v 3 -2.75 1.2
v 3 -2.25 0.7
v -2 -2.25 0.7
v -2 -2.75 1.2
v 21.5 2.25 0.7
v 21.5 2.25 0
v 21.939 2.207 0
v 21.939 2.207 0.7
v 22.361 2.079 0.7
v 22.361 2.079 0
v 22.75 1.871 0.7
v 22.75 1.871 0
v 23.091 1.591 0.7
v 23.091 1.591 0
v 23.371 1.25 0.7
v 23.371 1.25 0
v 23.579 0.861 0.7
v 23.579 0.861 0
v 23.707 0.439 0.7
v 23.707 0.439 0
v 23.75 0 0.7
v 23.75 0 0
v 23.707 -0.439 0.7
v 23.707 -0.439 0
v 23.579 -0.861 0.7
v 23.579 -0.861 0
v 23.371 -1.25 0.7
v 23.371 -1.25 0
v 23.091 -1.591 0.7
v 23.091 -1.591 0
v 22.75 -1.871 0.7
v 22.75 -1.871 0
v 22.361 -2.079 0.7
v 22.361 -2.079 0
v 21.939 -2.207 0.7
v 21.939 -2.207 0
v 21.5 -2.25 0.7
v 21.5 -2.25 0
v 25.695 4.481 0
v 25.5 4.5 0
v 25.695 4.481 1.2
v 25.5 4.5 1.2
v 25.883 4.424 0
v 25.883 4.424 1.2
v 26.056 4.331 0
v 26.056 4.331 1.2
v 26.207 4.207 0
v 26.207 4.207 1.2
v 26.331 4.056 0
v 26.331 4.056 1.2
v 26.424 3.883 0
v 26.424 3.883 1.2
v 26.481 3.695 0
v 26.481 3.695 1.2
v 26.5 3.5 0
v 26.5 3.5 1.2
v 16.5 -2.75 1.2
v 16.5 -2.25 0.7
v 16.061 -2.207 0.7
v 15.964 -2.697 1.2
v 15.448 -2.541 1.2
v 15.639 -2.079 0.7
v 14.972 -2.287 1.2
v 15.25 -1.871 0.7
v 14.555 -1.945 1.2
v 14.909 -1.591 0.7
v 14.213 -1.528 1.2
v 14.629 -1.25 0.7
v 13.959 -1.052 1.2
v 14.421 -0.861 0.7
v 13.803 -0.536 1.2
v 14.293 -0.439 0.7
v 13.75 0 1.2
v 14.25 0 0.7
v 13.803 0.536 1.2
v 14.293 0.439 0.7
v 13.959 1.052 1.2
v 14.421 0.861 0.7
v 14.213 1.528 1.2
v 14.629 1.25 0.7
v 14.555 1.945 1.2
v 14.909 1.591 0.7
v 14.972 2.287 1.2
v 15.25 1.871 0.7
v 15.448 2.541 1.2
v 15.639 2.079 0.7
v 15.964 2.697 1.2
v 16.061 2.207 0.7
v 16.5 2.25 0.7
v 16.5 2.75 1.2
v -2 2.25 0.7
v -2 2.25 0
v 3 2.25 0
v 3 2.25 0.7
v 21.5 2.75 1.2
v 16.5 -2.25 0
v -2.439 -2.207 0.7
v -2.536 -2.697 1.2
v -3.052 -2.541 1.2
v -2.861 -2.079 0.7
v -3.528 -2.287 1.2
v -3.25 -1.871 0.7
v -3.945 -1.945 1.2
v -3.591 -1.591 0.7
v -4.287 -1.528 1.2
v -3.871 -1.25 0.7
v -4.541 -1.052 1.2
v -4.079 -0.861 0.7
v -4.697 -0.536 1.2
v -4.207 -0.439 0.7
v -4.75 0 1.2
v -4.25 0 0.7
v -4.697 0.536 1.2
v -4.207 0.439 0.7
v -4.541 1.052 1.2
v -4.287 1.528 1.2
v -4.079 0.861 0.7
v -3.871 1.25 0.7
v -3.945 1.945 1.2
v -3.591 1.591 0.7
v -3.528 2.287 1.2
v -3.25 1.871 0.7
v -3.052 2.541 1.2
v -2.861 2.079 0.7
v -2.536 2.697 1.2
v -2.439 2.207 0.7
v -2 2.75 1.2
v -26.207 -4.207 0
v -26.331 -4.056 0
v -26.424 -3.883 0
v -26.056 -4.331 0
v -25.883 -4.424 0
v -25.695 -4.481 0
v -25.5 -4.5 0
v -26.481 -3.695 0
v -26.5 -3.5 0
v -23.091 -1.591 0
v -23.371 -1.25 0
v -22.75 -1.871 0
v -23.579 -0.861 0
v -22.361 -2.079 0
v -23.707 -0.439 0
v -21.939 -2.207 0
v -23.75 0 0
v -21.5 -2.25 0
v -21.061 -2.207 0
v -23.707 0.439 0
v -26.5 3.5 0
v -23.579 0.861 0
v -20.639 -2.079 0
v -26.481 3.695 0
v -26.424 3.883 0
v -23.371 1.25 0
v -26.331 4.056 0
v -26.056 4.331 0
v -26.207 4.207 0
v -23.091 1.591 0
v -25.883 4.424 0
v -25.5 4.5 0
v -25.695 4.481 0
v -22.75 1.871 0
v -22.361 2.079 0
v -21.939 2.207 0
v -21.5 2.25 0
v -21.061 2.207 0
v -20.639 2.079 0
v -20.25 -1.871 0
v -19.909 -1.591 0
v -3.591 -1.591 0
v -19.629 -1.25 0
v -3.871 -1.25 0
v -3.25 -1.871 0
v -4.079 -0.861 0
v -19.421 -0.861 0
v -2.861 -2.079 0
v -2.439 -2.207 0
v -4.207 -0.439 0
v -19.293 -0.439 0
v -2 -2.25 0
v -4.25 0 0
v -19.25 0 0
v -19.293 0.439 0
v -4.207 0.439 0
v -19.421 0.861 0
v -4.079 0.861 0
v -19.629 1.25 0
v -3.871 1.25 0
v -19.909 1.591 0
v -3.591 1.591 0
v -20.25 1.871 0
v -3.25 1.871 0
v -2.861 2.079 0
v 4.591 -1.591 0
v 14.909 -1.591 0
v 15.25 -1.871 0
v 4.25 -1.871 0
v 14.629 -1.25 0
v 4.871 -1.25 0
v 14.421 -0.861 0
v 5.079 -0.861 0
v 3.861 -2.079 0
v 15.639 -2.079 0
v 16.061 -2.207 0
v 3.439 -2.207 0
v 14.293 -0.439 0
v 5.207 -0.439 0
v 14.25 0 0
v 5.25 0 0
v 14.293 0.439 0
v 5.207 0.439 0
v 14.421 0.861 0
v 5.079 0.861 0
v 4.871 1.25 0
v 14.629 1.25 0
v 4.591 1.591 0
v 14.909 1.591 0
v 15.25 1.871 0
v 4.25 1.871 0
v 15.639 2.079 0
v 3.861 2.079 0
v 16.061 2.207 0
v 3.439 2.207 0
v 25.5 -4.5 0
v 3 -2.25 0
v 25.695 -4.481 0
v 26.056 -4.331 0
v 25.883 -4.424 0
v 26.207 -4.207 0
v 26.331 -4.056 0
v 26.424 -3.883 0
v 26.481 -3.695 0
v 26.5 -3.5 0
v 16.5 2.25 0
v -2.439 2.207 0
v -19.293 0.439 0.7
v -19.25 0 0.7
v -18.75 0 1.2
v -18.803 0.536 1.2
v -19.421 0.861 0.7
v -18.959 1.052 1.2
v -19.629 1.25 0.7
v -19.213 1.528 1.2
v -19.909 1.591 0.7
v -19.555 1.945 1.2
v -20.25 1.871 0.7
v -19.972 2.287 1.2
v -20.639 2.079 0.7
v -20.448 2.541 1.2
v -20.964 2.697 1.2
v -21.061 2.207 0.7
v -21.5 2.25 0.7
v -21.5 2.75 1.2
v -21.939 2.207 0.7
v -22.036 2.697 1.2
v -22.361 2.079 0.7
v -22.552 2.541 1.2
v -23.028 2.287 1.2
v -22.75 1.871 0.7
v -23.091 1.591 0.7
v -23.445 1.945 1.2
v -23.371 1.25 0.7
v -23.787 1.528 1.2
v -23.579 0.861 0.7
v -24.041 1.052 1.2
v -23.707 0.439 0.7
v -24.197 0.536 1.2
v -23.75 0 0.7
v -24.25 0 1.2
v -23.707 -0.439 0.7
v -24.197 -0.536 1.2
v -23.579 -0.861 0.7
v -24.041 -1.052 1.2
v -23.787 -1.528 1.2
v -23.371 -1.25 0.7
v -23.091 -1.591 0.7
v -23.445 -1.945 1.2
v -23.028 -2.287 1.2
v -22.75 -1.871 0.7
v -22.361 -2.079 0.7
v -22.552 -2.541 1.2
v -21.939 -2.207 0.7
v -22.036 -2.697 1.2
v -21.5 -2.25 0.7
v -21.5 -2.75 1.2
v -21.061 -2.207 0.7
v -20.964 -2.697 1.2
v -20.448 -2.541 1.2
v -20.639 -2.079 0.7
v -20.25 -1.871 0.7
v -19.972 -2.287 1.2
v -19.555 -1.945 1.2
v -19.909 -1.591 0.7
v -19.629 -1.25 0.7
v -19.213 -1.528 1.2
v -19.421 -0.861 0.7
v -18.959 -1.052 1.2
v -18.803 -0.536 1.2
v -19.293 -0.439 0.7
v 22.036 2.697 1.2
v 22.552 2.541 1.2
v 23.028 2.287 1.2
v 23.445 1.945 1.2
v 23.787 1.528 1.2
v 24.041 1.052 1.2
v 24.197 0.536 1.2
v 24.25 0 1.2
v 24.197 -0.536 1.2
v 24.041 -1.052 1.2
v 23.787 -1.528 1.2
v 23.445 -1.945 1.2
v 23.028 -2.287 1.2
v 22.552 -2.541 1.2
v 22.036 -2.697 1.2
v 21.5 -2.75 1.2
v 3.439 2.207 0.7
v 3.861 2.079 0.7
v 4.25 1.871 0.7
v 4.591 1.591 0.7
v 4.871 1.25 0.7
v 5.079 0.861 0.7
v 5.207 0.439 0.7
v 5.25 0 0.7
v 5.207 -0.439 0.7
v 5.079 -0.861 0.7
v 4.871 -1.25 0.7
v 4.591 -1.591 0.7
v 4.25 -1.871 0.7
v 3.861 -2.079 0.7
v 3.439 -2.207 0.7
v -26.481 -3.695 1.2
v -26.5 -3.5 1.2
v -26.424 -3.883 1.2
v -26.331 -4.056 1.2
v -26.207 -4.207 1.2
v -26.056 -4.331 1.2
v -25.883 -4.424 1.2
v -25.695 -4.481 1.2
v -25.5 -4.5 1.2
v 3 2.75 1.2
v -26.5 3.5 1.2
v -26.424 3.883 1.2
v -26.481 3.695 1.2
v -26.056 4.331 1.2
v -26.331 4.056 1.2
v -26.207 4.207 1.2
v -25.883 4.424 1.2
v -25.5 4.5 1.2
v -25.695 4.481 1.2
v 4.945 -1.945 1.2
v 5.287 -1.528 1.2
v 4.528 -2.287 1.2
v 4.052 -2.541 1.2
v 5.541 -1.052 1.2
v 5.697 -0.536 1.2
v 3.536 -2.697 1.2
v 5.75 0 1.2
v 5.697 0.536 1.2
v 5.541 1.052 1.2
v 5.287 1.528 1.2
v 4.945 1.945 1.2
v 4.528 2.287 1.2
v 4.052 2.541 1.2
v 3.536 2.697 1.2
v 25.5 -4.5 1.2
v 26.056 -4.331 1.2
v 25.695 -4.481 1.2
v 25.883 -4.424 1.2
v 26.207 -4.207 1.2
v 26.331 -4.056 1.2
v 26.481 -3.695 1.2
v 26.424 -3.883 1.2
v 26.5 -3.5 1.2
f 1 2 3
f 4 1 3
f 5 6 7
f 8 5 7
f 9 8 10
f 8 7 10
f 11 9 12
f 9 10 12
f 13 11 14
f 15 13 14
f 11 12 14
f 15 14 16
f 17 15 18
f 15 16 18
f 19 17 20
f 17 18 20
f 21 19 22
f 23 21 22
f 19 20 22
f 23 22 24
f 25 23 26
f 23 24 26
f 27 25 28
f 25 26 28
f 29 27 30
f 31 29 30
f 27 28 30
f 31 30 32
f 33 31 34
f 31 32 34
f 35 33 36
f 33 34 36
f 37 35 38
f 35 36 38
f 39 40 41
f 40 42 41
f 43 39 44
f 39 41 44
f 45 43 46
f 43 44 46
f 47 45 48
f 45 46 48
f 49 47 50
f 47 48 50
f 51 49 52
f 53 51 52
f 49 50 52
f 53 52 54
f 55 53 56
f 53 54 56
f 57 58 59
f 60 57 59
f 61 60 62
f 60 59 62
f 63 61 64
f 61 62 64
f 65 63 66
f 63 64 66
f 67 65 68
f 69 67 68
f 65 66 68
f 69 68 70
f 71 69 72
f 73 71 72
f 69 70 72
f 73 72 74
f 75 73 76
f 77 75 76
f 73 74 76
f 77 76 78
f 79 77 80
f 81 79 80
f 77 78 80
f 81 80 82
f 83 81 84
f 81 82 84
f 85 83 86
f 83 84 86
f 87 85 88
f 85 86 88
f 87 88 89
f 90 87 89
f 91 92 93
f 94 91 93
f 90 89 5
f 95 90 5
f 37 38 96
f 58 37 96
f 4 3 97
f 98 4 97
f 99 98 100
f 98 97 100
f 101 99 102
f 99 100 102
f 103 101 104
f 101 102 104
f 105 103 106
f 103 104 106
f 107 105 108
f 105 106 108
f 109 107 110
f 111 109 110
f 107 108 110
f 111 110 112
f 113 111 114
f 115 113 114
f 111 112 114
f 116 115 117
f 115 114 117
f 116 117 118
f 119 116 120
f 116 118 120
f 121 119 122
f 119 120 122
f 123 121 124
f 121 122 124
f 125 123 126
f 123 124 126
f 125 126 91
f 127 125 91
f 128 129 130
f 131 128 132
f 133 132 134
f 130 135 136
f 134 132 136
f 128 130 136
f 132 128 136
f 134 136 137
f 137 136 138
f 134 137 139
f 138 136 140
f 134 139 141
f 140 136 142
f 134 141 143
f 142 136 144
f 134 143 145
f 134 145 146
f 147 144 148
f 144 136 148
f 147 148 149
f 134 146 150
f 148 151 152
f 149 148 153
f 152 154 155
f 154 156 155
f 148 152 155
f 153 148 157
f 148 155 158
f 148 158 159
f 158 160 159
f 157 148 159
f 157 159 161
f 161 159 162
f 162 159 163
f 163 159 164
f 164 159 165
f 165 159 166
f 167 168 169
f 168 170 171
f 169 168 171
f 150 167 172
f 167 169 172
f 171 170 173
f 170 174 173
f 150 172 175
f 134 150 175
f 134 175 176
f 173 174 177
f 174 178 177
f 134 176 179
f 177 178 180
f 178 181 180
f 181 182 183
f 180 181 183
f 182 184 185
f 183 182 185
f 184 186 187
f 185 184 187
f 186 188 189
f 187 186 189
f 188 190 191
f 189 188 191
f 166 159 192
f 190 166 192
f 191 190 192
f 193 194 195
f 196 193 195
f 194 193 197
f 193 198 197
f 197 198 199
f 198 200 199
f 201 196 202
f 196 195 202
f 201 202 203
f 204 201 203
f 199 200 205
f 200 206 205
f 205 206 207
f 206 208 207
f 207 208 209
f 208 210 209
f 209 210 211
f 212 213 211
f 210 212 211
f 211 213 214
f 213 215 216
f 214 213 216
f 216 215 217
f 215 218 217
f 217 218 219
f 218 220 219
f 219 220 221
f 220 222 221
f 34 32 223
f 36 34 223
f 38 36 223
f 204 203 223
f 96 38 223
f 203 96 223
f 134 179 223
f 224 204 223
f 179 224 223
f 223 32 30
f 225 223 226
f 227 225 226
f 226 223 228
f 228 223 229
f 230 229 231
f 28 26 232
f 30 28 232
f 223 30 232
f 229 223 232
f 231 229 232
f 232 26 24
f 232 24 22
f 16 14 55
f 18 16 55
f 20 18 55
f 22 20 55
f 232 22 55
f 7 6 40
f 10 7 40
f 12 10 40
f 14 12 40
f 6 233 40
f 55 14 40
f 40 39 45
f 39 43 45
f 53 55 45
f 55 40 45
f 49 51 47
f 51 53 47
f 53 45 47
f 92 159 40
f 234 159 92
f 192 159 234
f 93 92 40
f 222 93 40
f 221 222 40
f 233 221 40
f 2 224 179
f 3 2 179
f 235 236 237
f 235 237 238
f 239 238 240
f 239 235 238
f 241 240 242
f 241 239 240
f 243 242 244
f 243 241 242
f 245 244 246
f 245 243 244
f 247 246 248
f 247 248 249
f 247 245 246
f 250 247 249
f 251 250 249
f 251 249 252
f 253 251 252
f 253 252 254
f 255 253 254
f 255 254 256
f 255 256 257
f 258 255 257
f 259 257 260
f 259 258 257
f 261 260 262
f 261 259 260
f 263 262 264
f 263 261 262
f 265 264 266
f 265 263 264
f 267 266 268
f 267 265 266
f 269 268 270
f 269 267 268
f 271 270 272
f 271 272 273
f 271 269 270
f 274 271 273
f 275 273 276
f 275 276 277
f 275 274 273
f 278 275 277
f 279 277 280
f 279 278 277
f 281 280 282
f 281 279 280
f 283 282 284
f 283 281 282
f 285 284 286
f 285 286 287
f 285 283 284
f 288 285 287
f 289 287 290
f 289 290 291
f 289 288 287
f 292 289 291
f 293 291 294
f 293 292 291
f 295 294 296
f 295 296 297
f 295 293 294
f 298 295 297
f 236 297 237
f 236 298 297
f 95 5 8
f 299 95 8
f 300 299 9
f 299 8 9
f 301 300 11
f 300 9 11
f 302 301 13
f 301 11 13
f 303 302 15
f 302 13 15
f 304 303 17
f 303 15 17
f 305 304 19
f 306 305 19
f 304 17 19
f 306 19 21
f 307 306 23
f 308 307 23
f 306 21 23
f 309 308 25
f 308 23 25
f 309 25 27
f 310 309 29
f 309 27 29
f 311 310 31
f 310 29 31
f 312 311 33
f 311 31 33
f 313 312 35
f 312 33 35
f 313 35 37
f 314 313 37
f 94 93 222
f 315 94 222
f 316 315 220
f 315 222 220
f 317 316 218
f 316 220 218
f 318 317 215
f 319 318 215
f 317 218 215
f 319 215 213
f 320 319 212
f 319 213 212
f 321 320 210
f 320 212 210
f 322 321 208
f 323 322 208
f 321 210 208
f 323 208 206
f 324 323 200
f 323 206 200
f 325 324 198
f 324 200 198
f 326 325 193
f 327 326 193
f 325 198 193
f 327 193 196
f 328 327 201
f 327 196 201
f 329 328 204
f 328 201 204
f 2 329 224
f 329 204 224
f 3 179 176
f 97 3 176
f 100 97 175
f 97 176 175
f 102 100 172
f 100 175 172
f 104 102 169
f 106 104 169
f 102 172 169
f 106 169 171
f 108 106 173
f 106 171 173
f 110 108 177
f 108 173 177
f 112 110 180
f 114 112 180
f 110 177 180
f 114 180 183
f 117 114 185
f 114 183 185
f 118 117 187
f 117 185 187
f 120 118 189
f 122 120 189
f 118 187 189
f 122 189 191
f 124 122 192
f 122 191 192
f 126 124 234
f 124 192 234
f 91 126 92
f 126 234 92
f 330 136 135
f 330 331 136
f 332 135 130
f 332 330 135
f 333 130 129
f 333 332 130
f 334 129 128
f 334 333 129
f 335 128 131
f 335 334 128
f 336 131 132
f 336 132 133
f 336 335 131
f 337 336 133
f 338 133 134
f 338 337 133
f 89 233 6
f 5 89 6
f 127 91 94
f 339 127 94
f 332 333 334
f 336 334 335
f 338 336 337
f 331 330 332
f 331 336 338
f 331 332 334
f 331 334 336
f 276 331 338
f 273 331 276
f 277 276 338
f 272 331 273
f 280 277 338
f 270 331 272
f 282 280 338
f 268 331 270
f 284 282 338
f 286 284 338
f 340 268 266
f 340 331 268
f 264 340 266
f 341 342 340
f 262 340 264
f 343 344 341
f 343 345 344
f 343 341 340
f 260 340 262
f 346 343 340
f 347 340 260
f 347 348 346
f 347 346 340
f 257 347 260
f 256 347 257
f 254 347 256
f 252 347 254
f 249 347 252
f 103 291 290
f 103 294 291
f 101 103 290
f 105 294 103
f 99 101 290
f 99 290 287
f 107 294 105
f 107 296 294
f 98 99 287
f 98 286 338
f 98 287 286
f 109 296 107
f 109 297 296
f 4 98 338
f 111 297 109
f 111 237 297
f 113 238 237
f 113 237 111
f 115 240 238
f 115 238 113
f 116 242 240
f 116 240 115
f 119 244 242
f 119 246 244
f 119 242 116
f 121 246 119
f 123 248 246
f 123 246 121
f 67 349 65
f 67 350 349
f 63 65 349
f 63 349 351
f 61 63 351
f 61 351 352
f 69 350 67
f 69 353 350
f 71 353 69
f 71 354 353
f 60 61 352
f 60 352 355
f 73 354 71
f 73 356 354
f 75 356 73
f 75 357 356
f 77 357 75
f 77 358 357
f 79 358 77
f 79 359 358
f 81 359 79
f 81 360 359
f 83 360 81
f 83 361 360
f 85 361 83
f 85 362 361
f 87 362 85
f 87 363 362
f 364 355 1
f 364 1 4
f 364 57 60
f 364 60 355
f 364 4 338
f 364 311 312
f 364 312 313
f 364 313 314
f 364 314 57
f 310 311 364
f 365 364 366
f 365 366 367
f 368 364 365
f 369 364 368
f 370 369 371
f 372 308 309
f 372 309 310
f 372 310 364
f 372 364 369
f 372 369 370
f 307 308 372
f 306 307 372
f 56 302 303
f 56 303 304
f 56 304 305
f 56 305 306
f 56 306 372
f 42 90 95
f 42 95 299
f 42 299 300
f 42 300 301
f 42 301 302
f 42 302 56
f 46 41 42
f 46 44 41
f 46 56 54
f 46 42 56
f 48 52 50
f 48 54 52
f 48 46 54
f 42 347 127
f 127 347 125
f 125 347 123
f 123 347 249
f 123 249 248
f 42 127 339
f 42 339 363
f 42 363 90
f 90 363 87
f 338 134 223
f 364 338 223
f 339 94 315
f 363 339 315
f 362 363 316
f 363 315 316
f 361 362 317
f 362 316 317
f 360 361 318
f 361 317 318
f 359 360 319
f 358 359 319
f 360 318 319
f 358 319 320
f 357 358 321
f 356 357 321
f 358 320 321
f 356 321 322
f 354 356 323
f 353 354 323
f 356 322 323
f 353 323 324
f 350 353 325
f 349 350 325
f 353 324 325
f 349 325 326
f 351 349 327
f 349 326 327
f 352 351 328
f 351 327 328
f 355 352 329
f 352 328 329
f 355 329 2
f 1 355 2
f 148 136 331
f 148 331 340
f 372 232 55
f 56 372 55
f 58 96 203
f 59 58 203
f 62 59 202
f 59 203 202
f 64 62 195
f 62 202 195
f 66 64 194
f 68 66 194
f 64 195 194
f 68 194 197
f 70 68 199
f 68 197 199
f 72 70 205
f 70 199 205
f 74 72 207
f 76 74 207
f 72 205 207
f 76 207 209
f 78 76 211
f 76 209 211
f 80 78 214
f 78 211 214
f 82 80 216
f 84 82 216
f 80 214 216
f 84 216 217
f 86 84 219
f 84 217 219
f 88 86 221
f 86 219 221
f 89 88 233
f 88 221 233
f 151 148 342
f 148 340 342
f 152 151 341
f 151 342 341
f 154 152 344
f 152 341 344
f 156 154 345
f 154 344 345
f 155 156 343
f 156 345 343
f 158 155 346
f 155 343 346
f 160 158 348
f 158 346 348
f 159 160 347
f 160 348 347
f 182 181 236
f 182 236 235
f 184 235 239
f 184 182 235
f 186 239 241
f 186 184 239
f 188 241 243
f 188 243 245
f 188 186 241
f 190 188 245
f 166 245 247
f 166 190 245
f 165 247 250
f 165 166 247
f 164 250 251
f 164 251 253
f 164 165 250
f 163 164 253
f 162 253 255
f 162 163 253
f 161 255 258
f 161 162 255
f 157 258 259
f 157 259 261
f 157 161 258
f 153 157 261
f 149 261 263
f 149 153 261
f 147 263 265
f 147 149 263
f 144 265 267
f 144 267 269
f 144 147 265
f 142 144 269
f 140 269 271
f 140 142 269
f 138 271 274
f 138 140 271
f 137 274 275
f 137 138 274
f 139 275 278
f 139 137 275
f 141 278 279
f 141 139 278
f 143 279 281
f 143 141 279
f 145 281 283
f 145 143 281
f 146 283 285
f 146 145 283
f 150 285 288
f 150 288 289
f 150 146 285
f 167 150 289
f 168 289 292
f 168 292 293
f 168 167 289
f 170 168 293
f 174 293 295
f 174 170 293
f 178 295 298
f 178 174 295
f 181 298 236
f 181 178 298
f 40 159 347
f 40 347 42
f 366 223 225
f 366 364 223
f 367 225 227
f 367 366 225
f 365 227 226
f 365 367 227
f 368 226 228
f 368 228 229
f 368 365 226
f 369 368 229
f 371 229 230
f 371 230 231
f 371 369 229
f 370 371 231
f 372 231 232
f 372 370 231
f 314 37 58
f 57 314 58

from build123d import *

# Parameters (mm, degrees)
F0_W     = 53
F0_H     = 9
F0_R     = 2.25
F1_DEPTH = 1.2
F2_R     = 1
F3_SIZE  = 0.5


with BuildPart() as f1:
    # F0 (on Top) → F1 (new body)
    with BuildSketch(Plane.XY):
        Rectangle(F0_W, F0_H)
        with Locations((-21.5, 0)):
            Circle(F0_R, mode=Mode.SUBTRACT)
        with BuildLine():
            Line((3, -2.25), (-2, -2.25))
            ThreePointArc((-2, -2.25), (-4.25, 0), (-2, 2.25))
            Line((-2, 2.25), (3, 2.25))
            ThreePointArc((3, 2.25), (5.25, 0), (3, -2.25))
        make_face(mode=Mode.SUBTRACT)
        with BuildLine():
            Line((21.5, -2.25), (16.5, -2.25))
            ThreePointArc((16.5, -2.25), (14.25, 0), (16.5, 2.25))
            Line((16.5, 2.25), (21.5, 2.25))
            ThreePointArc((21.5, 2.25), (23.75, 0), (21.5, -2.25))
        make_face(mode=Mode.SUBTRACT)
    extrude(amount=F1_DEPTH)

    # F2
    f2_edges = [f1.edges().sort_by_distance(p)[0] for p in [
        (-26.5, -4.5, 0.6),
        (-26.5, 4.5, 0.6),
        (26.5, -4.5, 0.6),
        (26.5, 4.5, 0.6),
    ]]
    fillet(f2_edges, radius=F2_R)

    # F3
    f3_edges = [f1.edges().sort_by_distance(p)[0] for p in [
        (-23.75, 0, 1.2),
        (-4.25, 0, 1.2),
        (14.25, 0, 1.2),
    ]]
    chamfer(f3_edges, length=F3_SIZE)


solid = f1.part
